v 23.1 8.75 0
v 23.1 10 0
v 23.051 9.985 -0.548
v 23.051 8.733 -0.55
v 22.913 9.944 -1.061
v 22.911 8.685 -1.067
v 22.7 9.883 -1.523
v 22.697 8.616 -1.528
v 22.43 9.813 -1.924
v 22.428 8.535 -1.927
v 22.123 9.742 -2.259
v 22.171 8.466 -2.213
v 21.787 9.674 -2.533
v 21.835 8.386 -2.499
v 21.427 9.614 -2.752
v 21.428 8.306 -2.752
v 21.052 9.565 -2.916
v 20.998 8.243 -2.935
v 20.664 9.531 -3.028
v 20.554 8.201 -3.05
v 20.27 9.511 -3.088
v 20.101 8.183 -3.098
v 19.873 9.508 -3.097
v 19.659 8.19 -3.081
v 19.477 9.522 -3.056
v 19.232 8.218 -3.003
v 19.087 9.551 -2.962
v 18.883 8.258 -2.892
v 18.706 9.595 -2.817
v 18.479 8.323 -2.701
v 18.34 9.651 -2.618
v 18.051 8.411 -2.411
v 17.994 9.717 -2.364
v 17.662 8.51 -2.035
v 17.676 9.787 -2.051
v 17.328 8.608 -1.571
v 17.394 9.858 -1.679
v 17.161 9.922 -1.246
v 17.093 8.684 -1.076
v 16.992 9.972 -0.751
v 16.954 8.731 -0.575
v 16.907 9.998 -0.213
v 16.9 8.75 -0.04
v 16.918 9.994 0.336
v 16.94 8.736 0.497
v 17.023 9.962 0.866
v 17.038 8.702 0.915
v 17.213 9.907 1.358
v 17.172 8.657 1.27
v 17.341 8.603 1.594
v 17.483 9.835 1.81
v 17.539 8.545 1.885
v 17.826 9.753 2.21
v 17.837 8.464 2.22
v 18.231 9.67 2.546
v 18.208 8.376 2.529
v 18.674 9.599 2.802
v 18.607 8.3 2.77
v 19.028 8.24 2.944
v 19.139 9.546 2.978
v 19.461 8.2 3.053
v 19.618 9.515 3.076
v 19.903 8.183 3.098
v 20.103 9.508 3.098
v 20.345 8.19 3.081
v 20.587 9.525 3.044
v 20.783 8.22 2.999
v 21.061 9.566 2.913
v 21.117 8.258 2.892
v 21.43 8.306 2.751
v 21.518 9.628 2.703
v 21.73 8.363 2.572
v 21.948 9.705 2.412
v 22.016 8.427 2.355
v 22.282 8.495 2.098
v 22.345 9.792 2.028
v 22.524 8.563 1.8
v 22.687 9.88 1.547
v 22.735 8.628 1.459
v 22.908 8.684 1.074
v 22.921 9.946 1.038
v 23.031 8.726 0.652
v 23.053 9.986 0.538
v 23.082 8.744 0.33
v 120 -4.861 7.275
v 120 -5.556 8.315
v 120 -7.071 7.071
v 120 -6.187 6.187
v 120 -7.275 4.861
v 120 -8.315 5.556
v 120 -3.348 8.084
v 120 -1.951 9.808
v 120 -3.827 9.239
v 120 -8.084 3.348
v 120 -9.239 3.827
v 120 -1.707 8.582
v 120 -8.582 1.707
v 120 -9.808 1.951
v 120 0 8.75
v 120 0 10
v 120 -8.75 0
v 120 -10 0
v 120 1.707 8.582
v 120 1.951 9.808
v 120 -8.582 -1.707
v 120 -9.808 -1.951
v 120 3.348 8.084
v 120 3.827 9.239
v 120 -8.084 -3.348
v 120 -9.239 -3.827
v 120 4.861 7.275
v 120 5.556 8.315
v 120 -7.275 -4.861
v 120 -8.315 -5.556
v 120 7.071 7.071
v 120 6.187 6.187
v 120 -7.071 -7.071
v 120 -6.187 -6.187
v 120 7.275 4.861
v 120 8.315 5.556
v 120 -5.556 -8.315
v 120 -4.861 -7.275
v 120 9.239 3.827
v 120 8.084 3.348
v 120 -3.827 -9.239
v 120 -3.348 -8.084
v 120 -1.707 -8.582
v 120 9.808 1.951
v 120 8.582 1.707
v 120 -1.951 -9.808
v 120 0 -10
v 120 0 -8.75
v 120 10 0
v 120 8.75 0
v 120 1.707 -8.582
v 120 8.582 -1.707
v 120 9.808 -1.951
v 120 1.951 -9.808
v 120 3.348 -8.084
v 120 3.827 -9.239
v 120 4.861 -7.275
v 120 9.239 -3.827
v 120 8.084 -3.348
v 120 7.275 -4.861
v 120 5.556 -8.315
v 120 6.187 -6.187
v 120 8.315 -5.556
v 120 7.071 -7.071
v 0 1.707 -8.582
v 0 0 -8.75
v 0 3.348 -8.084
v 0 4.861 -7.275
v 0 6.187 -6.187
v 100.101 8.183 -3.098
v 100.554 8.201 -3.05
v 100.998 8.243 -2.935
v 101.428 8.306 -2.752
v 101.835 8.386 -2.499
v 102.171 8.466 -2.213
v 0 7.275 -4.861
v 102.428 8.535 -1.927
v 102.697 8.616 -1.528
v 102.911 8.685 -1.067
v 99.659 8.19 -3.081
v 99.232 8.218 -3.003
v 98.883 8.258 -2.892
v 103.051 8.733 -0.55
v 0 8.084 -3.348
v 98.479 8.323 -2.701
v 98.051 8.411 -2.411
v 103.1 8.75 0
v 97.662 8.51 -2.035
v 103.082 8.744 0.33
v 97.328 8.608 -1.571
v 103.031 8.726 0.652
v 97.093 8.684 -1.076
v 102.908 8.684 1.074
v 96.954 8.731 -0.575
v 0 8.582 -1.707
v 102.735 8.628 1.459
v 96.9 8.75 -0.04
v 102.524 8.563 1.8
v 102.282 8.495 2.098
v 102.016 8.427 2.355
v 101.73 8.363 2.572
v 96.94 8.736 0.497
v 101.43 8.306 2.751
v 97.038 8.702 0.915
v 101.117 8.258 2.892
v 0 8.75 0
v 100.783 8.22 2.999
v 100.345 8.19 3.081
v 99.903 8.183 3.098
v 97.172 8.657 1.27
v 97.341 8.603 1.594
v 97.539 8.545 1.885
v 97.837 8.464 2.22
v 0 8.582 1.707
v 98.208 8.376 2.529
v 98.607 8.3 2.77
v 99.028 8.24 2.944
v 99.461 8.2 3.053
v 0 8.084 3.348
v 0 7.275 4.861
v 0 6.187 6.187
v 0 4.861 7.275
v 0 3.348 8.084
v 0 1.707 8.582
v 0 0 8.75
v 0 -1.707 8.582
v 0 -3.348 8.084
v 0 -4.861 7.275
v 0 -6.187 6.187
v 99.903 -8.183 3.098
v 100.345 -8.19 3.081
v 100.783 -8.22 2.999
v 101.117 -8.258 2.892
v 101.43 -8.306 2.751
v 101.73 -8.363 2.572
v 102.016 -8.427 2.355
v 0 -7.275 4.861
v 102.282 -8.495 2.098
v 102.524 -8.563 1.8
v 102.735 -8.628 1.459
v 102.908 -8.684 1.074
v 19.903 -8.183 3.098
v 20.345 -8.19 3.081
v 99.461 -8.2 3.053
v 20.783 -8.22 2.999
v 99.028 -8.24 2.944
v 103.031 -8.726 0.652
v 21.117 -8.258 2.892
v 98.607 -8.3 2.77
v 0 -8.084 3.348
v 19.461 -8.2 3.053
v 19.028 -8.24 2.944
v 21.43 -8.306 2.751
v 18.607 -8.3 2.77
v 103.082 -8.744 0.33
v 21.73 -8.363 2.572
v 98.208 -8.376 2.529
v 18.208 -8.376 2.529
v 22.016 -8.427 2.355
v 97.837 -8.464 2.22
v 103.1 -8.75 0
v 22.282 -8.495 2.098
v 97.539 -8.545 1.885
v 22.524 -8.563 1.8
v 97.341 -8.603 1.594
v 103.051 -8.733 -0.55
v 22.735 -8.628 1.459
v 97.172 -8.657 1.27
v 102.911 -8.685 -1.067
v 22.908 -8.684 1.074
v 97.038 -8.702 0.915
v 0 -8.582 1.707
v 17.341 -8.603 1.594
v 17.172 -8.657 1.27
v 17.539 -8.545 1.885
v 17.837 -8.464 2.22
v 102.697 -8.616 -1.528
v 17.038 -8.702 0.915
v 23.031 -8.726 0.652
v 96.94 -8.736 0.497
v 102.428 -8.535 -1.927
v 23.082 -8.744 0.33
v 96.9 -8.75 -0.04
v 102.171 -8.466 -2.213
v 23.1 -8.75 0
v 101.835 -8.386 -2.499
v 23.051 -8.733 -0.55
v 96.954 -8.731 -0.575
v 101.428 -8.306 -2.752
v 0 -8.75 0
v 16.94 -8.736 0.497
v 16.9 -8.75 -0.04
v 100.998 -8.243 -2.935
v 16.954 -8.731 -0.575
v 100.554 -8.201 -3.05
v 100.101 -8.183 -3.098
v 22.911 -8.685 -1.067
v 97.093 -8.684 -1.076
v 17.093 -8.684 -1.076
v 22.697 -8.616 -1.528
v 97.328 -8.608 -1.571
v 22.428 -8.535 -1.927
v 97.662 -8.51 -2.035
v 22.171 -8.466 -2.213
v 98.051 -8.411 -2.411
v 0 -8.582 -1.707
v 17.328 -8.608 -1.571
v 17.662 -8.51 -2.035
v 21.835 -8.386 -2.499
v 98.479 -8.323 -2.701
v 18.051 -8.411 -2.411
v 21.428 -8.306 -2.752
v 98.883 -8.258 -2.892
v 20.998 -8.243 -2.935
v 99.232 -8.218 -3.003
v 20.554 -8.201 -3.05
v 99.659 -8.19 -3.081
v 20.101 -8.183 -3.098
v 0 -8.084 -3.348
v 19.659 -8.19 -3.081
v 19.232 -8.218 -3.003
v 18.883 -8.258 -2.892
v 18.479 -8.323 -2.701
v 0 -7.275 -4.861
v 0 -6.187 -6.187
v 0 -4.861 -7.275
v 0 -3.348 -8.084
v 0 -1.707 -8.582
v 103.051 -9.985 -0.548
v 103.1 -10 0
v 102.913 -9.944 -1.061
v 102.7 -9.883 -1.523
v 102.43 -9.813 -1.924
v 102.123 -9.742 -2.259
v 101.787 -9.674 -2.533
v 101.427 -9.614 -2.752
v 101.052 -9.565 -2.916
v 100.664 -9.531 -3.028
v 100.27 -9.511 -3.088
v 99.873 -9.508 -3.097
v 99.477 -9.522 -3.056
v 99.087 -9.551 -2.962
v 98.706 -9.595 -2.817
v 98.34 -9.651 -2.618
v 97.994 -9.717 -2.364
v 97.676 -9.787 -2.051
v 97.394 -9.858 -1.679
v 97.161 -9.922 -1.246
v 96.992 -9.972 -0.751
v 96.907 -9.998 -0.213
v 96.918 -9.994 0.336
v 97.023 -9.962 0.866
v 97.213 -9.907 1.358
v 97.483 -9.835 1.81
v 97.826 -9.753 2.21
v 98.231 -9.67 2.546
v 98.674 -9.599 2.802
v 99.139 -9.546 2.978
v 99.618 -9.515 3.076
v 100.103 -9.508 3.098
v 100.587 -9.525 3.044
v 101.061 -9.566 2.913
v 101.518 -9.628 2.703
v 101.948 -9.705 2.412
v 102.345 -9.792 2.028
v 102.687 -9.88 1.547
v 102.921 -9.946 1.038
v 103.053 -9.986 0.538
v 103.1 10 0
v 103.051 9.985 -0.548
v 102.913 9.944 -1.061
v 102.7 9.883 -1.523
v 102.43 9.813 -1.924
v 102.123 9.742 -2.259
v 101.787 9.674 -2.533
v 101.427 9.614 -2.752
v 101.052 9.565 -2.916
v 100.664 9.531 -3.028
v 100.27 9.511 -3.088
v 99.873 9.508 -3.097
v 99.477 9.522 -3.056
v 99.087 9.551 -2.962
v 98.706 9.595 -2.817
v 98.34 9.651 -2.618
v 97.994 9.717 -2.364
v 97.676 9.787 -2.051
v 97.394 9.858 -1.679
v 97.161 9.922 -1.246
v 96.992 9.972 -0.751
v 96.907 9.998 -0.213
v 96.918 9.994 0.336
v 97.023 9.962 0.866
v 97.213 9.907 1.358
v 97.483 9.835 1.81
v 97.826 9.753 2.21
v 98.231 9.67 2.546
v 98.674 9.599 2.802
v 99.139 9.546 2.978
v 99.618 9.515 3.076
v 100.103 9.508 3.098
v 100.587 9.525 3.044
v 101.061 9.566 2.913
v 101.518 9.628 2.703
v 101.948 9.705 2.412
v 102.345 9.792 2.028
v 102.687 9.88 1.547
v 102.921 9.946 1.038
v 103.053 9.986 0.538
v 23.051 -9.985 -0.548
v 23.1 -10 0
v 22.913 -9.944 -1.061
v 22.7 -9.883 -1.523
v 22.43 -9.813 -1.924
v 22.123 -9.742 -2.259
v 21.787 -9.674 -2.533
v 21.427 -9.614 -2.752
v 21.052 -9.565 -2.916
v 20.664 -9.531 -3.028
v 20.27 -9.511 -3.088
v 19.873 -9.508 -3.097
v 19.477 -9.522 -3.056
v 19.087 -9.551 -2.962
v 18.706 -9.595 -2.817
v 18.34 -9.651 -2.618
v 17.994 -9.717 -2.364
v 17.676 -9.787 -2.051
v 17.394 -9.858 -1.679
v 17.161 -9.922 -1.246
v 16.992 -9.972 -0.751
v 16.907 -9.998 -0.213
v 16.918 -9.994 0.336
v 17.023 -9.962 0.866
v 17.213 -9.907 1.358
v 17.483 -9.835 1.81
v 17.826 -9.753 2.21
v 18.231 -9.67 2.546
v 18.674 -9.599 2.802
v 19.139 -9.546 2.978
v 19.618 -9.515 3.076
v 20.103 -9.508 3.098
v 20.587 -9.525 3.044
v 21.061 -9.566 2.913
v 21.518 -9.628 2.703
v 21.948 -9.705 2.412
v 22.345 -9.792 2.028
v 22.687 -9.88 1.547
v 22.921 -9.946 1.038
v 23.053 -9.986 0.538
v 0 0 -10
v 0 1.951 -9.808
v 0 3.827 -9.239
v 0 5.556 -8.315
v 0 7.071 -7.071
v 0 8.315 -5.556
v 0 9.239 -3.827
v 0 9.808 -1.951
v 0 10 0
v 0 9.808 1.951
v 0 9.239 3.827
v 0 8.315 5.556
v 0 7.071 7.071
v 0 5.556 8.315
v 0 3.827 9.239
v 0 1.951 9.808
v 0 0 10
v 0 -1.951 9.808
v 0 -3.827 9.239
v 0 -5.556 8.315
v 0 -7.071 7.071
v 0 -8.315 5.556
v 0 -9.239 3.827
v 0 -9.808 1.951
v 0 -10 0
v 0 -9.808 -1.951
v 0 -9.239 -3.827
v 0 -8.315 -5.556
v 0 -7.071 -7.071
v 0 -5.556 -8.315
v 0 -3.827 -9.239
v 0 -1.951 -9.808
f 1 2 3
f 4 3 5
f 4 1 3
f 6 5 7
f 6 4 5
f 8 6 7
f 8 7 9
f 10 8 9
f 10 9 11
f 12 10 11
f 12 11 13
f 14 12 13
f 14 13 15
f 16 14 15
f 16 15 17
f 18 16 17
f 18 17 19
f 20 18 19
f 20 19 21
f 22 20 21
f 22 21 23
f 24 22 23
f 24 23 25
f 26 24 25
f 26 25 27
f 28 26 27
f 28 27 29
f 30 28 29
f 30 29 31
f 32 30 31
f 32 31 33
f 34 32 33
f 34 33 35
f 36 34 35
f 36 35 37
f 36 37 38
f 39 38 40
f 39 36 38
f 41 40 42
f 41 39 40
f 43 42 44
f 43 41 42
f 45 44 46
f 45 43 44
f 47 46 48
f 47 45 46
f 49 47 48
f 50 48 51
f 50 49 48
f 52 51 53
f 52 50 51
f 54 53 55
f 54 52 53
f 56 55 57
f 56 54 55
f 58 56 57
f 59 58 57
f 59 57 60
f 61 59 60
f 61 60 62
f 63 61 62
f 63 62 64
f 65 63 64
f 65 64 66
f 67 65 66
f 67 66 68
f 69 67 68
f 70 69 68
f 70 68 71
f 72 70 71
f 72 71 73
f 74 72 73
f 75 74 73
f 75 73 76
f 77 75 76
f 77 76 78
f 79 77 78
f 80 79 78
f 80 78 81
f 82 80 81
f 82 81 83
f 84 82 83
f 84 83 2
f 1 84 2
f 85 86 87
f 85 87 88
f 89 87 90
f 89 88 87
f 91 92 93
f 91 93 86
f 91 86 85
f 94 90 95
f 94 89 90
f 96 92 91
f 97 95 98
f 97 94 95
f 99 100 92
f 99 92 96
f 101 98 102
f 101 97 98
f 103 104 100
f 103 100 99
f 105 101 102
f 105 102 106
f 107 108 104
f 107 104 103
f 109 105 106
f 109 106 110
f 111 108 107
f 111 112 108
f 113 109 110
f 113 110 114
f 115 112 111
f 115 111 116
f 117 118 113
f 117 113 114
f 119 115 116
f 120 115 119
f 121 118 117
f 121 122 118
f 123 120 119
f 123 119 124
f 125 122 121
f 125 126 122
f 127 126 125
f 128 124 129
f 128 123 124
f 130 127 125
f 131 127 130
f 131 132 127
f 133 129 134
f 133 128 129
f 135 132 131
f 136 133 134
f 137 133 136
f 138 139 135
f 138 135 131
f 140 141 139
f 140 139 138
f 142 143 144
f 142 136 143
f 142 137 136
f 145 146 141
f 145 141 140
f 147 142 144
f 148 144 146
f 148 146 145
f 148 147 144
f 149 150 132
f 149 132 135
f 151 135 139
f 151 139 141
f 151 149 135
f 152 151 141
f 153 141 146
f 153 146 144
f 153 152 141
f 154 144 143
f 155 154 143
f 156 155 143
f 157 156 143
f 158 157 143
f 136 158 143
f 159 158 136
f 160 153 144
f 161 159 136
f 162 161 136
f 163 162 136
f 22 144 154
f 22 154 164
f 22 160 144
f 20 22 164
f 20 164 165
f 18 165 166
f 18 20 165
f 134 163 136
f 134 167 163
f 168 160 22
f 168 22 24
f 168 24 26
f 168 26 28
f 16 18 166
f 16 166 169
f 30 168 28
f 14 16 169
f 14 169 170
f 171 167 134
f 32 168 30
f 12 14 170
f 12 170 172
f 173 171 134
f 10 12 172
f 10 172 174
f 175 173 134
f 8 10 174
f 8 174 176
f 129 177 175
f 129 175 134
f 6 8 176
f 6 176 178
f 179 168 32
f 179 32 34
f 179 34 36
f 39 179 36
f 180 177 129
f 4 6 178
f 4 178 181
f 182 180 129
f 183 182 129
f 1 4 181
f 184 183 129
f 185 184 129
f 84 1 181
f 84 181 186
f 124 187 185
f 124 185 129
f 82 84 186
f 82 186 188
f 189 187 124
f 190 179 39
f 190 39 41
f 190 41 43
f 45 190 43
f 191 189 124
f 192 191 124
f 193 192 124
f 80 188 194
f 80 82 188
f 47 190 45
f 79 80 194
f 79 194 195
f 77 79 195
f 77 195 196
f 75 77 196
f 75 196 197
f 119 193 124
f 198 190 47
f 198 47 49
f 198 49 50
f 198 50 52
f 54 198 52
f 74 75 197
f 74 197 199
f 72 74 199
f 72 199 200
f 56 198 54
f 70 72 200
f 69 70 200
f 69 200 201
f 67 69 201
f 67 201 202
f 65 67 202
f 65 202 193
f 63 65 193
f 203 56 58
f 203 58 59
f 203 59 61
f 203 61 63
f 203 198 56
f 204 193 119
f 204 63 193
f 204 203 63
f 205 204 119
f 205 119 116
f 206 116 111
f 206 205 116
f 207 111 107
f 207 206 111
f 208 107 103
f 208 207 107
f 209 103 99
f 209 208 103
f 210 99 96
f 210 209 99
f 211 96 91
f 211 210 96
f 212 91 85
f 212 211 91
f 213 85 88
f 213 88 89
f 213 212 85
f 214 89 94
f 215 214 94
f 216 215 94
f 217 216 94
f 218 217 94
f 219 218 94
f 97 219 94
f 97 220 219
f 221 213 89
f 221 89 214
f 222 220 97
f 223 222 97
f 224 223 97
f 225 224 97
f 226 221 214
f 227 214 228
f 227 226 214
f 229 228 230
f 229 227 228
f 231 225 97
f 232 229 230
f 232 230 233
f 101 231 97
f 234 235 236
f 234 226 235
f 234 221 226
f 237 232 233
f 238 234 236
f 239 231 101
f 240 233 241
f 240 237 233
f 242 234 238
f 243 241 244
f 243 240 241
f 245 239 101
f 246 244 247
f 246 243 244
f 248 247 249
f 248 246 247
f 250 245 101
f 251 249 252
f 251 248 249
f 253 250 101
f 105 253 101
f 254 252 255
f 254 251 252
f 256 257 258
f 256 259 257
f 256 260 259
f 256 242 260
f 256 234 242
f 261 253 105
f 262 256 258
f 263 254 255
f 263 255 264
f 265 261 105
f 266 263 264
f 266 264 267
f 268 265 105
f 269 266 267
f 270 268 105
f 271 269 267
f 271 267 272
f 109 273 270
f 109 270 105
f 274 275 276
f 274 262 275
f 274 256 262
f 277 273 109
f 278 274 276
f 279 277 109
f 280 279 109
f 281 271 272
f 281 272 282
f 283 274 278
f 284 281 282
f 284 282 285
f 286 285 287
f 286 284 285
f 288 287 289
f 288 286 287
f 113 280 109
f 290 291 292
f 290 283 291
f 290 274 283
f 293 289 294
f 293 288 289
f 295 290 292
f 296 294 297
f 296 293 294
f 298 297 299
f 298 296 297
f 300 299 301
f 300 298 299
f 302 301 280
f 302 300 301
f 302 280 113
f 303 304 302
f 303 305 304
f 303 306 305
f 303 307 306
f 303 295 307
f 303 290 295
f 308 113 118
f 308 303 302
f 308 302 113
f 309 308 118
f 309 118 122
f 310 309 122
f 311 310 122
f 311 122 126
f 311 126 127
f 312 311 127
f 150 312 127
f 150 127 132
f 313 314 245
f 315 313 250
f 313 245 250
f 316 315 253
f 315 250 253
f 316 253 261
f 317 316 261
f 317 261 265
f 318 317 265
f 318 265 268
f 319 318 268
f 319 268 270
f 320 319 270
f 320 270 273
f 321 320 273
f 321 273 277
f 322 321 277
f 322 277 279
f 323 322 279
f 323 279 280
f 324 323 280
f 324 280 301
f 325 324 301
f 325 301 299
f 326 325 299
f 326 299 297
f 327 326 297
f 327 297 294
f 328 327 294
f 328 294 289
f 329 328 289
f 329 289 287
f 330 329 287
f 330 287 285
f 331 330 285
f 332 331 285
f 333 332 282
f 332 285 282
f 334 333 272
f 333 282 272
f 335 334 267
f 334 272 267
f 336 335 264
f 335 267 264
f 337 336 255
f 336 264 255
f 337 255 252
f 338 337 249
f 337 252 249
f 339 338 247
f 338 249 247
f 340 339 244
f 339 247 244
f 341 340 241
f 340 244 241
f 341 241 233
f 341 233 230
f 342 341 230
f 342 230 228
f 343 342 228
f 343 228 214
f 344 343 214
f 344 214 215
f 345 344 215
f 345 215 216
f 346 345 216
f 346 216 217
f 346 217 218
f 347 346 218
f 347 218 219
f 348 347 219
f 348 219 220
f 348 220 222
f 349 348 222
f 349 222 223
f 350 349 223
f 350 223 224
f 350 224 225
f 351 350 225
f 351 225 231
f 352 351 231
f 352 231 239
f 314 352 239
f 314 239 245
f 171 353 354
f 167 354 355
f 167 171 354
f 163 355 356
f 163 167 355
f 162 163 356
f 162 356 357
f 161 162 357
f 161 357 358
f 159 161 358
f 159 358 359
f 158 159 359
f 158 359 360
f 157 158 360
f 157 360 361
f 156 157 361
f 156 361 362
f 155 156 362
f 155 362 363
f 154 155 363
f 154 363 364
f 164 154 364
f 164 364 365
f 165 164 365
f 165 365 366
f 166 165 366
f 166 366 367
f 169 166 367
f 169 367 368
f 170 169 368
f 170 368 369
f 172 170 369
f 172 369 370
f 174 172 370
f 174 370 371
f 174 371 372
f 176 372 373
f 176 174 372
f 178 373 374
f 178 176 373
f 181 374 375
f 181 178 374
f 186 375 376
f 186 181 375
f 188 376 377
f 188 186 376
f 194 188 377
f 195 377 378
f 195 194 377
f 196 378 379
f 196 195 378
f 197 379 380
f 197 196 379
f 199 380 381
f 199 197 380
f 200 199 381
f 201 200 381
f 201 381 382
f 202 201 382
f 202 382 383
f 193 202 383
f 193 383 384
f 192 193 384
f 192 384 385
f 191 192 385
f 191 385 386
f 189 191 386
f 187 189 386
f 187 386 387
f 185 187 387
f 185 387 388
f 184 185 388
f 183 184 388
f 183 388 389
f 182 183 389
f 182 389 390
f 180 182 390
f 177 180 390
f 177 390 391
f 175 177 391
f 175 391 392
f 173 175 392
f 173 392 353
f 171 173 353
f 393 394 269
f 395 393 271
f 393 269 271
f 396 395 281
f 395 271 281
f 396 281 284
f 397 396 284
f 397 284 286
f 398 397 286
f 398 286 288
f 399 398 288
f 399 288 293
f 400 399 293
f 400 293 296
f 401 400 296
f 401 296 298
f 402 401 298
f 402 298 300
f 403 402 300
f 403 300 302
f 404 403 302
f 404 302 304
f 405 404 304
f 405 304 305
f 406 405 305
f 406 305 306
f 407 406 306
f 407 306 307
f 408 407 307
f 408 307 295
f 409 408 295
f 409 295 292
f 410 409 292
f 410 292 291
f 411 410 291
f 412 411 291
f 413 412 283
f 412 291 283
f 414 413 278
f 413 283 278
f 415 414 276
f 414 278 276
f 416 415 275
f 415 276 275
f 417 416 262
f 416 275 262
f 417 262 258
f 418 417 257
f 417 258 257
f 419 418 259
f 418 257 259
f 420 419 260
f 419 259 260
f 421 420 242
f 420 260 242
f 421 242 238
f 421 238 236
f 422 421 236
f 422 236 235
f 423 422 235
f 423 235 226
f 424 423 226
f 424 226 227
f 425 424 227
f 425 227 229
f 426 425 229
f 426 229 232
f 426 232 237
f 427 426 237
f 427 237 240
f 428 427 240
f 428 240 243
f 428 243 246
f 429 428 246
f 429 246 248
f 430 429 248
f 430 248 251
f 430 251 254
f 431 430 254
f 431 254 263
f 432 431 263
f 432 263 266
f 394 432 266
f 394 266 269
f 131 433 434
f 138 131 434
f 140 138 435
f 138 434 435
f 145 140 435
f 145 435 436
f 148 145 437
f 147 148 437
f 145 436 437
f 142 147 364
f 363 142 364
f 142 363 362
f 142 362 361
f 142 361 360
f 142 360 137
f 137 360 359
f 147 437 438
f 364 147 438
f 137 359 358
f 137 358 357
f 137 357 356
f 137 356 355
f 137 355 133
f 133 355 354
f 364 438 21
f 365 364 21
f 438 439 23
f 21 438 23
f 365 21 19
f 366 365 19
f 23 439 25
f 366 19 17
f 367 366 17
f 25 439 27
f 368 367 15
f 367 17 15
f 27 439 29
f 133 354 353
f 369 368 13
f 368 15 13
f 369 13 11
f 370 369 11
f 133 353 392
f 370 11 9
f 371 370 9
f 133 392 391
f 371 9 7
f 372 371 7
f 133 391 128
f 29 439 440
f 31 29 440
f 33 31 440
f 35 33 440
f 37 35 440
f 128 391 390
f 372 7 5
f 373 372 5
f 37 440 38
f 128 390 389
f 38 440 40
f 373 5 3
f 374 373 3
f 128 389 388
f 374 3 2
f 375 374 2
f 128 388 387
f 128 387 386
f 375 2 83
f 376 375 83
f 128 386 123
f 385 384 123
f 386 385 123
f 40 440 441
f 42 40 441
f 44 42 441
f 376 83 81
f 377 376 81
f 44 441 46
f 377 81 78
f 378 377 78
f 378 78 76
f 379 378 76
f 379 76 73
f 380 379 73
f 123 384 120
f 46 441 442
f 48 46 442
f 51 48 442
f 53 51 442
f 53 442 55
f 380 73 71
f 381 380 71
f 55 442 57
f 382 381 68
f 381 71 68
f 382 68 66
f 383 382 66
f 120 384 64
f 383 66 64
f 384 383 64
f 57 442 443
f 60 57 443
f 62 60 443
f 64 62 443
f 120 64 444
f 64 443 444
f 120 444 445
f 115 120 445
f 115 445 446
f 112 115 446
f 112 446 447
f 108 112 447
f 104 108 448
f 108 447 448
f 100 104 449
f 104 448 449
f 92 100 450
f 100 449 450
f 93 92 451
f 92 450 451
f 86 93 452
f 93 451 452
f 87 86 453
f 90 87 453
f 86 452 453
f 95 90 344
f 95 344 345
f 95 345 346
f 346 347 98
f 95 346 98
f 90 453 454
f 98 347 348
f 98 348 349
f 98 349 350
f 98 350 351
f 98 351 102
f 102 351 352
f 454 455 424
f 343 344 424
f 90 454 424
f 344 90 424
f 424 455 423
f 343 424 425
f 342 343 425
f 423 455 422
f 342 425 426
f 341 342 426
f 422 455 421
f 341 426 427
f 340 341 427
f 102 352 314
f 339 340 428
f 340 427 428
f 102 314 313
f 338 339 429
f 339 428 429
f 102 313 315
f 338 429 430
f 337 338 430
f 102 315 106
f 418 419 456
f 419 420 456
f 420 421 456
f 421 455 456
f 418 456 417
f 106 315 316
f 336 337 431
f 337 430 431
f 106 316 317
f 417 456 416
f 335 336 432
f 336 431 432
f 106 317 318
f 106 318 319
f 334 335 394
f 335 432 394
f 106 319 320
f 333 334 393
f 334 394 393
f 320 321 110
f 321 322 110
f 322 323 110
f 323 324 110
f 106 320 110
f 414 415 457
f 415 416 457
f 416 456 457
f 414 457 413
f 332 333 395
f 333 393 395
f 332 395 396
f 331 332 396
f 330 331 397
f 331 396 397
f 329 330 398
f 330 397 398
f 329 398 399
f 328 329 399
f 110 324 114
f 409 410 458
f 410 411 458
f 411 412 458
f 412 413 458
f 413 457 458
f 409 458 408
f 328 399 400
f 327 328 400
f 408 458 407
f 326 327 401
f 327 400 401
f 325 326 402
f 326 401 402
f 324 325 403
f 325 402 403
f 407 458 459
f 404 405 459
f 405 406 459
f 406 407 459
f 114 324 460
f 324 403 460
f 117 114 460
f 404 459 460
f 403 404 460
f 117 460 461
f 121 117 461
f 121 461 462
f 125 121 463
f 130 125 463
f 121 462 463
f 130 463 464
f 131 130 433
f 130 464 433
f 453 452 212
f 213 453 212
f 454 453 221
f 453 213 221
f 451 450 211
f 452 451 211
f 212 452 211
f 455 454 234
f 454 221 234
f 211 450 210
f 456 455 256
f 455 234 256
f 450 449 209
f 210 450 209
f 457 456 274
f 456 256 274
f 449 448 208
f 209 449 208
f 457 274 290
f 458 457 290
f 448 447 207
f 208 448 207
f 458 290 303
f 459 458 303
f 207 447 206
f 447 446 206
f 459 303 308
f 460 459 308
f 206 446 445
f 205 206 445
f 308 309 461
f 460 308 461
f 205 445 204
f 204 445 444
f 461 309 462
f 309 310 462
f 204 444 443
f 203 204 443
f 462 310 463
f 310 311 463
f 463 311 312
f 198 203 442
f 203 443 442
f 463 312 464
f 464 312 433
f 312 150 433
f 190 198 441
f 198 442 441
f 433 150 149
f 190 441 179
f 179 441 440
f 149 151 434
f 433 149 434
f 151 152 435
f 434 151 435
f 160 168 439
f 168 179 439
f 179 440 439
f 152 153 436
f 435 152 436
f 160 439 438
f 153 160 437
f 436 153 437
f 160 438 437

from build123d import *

# Parameters (mm, degrees)
SKETCH_1_R               = 10
SKETCH_1_R_2             = 8.75
EXTRUDE_1_DEPTH          = 120
SKETCH_2_R               = 3.1
CUT_EXTRUDE_1_DEPTH      = 11
CUT_EXTRUDE_1_DEPTH_BACK = 11


with BuildPart() as part:
    # 草图1 → 凸台-拉伸1 (new body)
    with BuildSketch(Plane(origin=(0, 0, 0), x_dir=(0, 0, -1), z_dir=(1, 0, 0))):
        Circle(SKETCH_1_R)
        Circle(SKETCH_1_R_2, mode=Mode.SUBTRACT)
    extrude(amount=EXTRUDE_1_DEPTH)

    # 草图2 → 切除-拉伸1 (cut, two sides)
    with BuildSketch(Plane(origin=(0, 0, 0), x_dir=(1, 0, 0), z_dir=(0, 1, 0))) as cut_extrude_1_sk:
        with Locations((20, 0)):
            Circle(SKETCH_2_R)
        with Locations((100, 0)):
            Circle(SKETCH_2_R)
    extrude(amount=CUT_EXTRUDE_1_DEPTH, mode=Mode.SUBTRACT)
    extrude(cut_extrude_1_sk.sketch, amount=-CUT_EXTRUDE_1_DEPTH_BACK, mode=Mode.SUBTRACT)


solid = part.part
